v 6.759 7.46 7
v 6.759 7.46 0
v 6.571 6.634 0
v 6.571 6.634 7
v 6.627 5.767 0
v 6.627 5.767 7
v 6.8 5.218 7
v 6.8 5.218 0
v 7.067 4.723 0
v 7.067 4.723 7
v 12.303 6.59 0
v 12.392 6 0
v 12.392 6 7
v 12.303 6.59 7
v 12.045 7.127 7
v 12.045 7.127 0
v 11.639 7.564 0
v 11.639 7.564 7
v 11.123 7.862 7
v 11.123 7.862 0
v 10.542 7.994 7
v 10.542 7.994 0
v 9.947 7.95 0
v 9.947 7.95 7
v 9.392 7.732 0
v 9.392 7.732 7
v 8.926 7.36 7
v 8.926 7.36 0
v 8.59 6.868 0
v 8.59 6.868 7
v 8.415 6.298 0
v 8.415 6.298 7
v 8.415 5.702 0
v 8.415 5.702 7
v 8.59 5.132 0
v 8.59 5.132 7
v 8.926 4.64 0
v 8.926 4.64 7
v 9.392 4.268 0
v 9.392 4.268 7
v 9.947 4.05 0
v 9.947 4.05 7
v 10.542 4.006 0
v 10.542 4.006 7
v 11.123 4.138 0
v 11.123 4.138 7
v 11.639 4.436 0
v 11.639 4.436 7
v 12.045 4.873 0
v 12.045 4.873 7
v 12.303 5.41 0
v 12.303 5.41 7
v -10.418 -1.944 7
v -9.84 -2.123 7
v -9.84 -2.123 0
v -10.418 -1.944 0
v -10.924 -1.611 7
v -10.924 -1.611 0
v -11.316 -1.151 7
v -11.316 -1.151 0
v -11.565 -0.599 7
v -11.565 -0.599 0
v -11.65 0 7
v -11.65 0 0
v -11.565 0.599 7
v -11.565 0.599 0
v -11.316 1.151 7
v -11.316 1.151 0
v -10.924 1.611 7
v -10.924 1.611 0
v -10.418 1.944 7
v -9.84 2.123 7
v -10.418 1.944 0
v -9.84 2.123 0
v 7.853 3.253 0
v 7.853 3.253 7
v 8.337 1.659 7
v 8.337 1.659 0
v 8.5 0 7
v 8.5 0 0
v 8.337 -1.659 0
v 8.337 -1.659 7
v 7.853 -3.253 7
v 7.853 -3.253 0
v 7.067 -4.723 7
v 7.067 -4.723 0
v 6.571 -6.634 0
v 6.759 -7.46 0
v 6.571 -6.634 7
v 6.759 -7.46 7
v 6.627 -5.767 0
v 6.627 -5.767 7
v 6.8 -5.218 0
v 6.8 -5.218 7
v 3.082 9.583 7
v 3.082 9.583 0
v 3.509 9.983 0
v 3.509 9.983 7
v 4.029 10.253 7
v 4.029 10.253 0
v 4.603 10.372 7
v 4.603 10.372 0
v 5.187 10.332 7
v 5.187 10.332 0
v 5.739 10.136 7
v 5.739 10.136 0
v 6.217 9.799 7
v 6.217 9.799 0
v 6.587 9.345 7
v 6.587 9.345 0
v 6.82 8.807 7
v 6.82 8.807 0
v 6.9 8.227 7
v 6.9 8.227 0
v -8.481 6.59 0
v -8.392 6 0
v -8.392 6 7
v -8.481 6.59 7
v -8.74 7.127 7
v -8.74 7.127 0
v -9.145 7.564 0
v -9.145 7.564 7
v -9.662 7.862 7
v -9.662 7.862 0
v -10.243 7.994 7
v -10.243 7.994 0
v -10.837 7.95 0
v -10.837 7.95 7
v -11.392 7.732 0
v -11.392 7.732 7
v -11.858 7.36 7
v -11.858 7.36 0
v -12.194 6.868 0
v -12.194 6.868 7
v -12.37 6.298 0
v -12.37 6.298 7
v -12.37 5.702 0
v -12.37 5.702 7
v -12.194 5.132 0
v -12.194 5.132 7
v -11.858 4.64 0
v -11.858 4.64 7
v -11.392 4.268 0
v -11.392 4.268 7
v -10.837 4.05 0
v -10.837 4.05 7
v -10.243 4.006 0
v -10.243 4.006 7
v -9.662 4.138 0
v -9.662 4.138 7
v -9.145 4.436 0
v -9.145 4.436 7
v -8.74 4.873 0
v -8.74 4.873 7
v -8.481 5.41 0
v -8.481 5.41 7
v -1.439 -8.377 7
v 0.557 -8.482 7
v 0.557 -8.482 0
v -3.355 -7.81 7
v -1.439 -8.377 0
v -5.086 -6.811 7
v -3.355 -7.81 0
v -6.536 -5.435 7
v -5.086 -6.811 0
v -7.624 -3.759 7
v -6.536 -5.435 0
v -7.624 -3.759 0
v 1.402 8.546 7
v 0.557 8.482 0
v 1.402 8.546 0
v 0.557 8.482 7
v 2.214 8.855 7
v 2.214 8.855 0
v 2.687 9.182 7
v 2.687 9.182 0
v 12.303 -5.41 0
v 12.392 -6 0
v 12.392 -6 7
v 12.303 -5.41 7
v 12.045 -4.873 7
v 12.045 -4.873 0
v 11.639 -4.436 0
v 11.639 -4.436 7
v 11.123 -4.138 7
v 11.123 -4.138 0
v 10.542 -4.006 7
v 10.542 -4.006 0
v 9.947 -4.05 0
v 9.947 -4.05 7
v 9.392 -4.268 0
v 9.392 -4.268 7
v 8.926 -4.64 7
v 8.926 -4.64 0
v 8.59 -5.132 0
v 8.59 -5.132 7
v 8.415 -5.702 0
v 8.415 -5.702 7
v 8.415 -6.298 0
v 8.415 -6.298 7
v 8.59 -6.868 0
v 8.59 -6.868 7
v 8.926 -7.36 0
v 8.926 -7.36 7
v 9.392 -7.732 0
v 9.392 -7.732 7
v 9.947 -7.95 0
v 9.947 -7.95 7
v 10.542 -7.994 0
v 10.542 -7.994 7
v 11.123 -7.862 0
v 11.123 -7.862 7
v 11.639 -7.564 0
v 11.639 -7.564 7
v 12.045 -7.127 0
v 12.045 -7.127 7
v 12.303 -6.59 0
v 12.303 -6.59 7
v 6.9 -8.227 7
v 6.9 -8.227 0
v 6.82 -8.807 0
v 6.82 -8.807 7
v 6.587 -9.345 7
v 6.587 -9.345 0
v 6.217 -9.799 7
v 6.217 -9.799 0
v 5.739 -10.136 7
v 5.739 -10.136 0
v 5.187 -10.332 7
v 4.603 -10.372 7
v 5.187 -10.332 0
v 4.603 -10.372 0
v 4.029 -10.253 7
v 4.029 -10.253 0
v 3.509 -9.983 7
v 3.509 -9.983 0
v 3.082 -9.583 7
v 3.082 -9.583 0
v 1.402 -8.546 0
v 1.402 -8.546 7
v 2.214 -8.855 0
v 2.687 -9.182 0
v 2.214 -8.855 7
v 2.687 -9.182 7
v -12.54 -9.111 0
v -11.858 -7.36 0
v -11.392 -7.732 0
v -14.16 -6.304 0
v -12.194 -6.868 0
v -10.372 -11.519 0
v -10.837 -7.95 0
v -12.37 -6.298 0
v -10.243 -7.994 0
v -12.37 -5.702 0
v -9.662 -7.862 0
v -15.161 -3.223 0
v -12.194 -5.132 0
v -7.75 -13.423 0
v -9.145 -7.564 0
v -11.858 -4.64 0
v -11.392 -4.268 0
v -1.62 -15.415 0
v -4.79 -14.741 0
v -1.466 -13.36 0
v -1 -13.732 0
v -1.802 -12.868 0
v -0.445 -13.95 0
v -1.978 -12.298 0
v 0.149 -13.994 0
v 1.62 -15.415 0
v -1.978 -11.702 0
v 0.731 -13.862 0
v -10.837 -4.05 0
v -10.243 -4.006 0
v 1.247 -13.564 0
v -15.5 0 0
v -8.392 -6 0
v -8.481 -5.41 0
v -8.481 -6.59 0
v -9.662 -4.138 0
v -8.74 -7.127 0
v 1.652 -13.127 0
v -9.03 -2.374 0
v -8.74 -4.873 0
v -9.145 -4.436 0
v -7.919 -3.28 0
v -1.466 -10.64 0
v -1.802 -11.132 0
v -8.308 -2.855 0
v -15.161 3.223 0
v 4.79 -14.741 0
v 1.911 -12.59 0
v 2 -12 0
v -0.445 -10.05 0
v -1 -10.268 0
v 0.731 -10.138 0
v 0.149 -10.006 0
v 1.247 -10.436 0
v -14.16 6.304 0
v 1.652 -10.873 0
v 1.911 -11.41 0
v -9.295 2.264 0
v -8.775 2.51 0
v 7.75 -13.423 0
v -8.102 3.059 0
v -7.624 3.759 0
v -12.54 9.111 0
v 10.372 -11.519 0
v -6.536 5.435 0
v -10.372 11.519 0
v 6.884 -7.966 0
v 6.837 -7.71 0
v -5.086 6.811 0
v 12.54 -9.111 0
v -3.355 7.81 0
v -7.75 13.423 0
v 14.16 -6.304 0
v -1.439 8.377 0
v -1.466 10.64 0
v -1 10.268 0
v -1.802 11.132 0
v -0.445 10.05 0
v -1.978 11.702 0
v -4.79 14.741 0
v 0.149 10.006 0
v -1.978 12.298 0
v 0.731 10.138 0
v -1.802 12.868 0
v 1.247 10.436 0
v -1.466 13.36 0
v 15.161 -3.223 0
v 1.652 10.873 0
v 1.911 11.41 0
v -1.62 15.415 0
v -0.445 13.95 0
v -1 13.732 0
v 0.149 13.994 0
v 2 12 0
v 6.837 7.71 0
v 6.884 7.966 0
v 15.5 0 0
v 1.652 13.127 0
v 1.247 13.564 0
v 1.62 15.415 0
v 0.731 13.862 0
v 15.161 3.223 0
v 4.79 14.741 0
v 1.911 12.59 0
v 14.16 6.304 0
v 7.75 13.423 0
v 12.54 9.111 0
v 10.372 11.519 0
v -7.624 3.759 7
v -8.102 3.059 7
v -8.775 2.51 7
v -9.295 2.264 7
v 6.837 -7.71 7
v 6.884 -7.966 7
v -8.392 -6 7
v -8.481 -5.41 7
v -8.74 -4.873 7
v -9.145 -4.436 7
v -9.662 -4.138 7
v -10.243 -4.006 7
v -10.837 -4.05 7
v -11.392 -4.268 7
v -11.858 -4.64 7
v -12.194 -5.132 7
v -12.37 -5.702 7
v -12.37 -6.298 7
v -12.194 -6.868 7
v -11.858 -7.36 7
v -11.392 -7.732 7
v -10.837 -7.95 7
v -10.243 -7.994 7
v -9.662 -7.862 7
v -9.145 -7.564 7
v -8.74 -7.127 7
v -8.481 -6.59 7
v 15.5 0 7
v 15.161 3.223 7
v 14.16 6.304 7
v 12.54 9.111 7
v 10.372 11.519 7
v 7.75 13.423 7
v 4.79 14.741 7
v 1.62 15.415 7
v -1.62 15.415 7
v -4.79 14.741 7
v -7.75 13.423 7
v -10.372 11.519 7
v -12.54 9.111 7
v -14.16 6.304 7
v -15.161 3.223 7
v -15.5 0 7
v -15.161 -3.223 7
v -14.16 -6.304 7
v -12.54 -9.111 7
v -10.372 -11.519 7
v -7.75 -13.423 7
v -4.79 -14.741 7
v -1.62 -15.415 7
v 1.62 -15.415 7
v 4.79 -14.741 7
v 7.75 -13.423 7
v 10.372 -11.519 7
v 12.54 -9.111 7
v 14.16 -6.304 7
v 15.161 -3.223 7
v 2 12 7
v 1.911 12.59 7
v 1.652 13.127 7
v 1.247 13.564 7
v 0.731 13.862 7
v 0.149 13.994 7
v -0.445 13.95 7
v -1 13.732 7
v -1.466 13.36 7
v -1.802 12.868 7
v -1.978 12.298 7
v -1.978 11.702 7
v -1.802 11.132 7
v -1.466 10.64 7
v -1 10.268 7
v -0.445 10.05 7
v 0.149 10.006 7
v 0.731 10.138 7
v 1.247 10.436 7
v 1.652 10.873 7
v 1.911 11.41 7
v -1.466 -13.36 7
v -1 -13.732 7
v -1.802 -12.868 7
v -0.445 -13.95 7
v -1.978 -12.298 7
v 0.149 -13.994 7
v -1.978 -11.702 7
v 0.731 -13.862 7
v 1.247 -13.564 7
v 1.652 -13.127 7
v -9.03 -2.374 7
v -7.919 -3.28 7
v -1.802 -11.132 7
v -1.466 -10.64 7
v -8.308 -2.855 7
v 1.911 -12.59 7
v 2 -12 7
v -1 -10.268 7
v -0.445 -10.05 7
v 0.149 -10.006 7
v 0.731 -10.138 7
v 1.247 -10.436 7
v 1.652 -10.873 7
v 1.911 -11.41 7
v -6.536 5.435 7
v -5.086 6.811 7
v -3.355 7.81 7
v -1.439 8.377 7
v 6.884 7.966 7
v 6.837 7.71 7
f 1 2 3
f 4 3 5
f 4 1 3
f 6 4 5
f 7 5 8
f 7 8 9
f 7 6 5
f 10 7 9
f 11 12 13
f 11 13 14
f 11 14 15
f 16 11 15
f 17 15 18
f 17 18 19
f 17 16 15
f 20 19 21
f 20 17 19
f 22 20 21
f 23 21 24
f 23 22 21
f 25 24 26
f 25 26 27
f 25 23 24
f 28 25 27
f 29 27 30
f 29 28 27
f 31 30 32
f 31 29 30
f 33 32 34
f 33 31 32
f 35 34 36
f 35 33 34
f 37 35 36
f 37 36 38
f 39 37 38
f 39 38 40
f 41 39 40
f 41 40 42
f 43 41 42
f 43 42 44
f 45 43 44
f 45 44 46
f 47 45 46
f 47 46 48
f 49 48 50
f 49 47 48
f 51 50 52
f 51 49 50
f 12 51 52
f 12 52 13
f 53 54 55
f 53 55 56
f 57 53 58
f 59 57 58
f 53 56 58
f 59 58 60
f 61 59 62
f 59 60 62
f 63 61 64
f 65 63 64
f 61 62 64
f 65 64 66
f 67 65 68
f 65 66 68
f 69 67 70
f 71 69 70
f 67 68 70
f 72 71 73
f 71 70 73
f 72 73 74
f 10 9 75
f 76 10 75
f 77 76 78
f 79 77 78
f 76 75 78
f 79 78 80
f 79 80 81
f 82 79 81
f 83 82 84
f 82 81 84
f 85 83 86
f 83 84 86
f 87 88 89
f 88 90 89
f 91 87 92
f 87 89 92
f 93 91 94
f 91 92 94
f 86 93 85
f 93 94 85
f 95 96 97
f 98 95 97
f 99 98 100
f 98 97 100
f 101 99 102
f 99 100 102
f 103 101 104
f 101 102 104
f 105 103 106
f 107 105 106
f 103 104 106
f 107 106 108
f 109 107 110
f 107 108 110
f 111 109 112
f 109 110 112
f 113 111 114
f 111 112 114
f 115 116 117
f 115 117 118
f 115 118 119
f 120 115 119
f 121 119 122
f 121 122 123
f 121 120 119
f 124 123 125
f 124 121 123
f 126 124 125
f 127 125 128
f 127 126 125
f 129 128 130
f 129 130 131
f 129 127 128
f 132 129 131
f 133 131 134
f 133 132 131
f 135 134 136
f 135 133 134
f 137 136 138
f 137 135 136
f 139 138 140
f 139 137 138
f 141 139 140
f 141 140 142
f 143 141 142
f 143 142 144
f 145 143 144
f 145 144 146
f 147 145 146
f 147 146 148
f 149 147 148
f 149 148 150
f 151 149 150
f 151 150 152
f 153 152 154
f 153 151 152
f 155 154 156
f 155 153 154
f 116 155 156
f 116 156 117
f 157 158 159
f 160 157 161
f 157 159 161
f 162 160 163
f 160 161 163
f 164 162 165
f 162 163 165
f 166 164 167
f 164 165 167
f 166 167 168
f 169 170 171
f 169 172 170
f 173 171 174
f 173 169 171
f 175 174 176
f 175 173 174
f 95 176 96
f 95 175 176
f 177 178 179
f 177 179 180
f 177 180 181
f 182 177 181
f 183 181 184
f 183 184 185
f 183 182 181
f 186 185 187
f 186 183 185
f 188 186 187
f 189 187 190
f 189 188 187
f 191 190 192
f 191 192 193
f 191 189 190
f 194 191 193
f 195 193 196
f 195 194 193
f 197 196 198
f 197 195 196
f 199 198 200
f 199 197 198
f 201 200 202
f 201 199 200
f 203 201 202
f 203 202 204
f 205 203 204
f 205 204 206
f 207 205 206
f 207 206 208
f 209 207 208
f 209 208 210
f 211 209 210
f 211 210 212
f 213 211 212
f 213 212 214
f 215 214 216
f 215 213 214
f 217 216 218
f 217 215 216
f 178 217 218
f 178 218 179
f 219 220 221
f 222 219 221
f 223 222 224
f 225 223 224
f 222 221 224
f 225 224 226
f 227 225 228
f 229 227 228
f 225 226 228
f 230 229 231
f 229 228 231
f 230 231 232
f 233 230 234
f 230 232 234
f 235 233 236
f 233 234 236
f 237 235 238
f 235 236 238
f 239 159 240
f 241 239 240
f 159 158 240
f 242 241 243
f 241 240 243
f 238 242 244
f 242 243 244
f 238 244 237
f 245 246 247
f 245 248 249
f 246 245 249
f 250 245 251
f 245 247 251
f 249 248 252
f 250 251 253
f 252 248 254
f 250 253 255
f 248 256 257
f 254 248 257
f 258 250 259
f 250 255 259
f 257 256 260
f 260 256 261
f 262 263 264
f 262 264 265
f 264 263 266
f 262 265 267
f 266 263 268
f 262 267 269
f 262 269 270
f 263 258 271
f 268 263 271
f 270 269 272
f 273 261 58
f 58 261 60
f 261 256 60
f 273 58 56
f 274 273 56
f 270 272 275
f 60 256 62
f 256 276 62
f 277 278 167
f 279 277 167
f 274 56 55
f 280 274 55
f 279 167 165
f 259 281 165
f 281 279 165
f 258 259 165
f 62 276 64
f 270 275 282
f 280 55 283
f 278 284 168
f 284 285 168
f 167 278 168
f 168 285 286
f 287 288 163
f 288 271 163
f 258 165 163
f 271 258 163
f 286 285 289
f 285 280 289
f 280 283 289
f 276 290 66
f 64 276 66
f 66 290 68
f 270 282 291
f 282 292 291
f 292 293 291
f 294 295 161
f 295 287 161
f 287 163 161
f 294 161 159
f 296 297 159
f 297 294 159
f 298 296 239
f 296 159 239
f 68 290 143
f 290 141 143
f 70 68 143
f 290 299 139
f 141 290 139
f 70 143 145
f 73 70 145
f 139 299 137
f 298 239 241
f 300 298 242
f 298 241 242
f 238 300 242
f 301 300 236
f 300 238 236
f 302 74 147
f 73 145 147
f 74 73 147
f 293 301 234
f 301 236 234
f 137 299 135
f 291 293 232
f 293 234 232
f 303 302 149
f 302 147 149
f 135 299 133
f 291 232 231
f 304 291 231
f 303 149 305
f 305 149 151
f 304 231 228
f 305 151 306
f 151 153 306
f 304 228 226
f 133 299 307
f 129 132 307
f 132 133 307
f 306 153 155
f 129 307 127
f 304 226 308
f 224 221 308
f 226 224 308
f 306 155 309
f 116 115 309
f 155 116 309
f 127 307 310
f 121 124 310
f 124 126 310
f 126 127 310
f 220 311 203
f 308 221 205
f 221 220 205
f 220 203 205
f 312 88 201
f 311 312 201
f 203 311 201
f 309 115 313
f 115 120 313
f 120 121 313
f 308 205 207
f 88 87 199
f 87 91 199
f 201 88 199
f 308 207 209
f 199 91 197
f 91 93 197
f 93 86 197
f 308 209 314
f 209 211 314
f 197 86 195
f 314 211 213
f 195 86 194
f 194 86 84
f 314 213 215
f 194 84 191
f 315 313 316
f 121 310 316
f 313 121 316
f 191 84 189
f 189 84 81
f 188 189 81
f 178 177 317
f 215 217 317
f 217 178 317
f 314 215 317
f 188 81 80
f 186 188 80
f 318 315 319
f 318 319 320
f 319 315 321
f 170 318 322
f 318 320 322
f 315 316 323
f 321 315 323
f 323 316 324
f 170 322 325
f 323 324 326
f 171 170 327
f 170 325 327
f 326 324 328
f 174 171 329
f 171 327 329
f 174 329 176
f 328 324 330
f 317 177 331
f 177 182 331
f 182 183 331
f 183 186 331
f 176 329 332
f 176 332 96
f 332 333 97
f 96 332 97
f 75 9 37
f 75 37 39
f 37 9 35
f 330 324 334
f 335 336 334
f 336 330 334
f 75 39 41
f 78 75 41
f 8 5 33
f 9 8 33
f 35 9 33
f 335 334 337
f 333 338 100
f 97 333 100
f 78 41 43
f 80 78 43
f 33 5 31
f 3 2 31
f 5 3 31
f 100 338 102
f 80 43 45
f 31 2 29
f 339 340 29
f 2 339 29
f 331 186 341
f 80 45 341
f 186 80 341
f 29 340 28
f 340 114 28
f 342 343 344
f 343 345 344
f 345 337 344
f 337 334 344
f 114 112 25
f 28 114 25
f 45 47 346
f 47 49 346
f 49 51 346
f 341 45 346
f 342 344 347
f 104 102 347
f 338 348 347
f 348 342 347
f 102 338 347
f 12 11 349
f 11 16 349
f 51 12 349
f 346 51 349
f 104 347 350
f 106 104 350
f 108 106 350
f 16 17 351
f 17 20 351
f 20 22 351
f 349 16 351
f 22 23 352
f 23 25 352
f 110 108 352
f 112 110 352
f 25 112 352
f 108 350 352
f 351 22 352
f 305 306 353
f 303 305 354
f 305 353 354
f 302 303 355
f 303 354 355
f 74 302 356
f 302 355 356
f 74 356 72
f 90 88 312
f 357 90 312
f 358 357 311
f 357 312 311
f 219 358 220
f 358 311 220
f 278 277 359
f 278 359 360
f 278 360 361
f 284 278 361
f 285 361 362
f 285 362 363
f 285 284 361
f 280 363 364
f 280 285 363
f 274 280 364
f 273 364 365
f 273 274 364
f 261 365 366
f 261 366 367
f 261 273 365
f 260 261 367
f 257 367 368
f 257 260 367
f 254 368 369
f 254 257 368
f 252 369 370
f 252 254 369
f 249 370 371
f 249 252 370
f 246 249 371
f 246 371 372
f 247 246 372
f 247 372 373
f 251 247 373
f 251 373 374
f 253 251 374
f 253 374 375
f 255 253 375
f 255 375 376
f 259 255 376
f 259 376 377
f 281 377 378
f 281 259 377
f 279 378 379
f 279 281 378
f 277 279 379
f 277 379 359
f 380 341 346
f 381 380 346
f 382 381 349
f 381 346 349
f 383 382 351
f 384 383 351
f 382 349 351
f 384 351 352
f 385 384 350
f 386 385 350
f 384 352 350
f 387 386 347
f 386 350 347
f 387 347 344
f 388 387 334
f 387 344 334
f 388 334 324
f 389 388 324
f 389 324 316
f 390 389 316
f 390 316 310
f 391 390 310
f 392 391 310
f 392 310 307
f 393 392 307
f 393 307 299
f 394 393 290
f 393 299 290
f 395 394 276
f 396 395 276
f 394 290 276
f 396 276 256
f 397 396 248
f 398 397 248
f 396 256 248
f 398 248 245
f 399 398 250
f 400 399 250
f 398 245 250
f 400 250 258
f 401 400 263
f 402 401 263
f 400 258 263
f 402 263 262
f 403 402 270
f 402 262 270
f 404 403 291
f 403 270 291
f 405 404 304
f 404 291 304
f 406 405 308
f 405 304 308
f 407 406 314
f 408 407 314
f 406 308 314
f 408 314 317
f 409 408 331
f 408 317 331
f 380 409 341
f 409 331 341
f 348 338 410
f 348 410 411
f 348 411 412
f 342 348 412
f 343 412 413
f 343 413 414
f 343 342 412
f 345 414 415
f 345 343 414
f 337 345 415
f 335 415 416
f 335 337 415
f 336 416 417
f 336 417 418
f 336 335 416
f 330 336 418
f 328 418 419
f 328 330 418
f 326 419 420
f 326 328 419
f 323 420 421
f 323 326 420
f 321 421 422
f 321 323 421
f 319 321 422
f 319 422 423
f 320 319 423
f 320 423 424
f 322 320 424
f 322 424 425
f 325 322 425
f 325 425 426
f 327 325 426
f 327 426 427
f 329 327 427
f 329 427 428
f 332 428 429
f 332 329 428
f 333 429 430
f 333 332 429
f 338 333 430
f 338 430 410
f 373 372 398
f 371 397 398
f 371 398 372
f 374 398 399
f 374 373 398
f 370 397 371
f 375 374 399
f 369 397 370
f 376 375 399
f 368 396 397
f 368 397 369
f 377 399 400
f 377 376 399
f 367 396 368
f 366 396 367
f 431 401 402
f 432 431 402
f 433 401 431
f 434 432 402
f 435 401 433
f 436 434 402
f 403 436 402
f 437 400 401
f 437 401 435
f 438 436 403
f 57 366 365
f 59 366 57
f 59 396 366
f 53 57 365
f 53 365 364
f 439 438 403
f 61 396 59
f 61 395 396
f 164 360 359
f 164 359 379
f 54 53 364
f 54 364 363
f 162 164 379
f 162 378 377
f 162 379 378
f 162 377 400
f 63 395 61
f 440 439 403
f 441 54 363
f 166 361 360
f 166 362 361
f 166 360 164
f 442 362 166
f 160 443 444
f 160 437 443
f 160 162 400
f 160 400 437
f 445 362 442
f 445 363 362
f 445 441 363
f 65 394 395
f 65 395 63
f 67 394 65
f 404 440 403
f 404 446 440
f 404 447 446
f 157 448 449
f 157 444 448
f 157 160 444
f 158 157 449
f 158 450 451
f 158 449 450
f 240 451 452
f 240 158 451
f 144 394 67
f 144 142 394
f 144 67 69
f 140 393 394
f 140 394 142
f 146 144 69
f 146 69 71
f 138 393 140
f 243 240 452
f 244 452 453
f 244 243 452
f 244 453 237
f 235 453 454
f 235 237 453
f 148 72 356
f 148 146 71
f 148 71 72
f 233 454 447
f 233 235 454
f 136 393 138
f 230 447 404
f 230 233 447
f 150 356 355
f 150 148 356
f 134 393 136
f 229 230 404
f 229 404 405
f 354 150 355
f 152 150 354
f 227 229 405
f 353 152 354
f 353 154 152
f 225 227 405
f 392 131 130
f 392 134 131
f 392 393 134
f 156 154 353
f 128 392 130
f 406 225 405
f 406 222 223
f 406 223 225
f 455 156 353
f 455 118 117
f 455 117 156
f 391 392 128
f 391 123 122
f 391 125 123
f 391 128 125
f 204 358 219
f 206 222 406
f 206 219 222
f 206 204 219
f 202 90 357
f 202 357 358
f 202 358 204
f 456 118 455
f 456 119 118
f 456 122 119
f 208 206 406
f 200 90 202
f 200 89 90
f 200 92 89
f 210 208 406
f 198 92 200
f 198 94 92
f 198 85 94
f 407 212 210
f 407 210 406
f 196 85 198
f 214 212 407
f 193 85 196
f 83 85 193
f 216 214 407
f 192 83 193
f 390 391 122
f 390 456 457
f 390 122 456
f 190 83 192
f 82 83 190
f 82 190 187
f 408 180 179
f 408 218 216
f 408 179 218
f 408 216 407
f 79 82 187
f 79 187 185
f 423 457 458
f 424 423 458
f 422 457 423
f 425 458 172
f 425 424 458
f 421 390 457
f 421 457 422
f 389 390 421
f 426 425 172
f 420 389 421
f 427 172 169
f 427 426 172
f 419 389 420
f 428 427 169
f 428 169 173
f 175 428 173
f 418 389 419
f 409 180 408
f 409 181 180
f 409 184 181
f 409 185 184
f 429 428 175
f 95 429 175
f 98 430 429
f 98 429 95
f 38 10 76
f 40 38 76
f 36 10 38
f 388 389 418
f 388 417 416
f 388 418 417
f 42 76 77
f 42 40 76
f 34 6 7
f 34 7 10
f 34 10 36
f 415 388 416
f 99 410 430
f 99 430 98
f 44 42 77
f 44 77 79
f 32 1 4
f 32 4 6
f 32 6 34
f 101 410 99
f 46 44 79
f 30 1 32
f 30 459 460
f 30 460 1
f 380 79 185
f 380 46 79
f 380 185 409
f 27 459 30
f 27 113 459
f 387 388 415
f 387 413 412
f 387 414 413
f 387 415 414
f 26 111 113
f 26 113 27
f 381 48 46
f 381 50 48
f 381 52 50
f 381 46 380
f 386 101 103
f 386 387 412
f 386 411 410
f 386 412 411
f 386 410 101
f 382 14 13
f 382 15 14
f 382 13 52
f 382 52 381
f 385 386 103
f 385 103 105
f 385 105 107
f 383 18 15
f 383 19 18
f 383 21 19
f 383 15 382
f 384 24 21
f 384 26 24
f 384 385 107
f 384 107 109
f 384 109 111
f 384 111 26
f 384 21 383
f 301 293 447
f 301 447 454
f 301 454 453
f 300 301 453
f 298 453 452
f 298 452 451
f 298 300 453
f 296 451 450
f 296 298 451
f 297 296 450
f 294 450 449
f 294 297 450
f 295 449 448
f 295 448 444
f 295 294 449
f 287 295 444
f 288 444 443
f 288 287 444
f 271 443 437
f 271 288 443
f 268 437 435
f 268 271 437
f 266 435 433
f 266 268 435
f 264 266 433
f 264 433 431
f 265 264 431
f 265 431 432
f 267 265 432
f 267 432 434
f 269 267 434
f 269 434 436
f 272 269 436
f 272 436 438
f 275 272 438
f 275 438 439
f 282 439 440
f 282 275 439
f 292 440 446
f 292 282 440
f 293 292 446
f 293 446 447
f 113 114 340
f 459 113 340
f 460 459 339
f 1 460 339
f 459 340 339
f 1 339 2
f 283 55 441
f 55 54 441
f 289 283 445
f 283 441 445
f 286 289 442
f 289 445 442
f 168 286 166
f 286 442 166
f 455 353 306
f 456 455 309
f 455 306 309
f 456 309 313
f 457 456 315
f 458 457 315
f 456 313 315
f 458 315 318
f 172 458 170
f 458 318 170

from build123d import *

# Parameters (mm, degrees)
SKETCH_1_R      = 15.5
SKETCH_1_R_2    = 2
EXTRUDE_1_DEPTH = 7
FILLET_1_R      = 3


with BuildPart() as part:
    # 草图1 → 凸台-拉伸1 (new body)
    with BuildSketch(Plane.XY):
        Circle(SKETCH_1_R)
        with Locations((-10.392304845, -6)):
            Circle(SKETCH_1_R_2, mode=Mode.SUBTRACT)
        with Locations((0, -12)):
            Circle(SKETCH_1_R_2, mode=Mode.SUBTRACT)
        with Locations((10.392304845, -6)):
            Circle(SKETCH_1_R_2, mode=Mode.SUBTRACT)
        with Locations((-10.392304845, 6)):
            Circle(SKETCH_1_R_2, mode=Mode.SUBTRACT)
        with BuildLine():
            ThreePointArc((2.604308084, 8.091203829), (4.681947148, 10.376164045), (6.9, 8.227241336))
            ThreePointArc((6.9, 8.227241336), (6.576995231, 7.093844482), (5.705034021, 6.300998875))
            ThreePointArc((5.705034021, 6.300998875), (7.769903126, 3.446535276), (8.5, 0))
            ThreePointArc((8.5, 0), (7.769903126, -3.446535276), (5.705034021, -6.300998875))
            ThreePointArc((5.705034021, -6.300998875), (6.576995231, -7.093844482), (6.9, -8.227241336))
            ThreePointArc((6.9, -8.227241336), (4.681947148, -10.376164045), (2.604308084, -8.091203829))
            ThreePointArc((2.604308084, -8.091203829), (-4.25, -7.361215932), (-8.309342105, -1.790204954))
            ThreePointArc((-8.309342105, -1.790204954), (-11.65, 0), (-8.309342105, 1.790204954))
            ThreePointArc((-8.309342105, 1.790204954), (-4.25, 7.361215932), (2.604308084, 8.091203829))
        make_face(mode=Mode.SUBTRACT)
        with Locations((10.392304845, 6)):
            Circle(SKETCH_1_R_2, mode=Mode.SUBTRACT)
        with Locations((0, 12)):
            Circle(SKETCH_1_R_2, mode=Mode.SUBTRACT)
    extrude(amount=EXTRUDE_1_DEPTH)

    # 圆角1
    fillet_1_edges = [part.edges().sort_by_distance(p)[0] for p in [
        (-8.309342105, 1.790204954, 3.5),
        (-8.309342105, -1.790204954, 3.5),
        (2.604308084, -8.091203829, 3.5),
        (5.705034021, -6.300998875, 3.5),
        (5.705034021, 6.300998875, 3.5),
        (2.604308084, 8.091203829, 3.5),
    ]]
    fillet(fillet_1_edges, radius=FILLET_1_R)


solid = part.part
